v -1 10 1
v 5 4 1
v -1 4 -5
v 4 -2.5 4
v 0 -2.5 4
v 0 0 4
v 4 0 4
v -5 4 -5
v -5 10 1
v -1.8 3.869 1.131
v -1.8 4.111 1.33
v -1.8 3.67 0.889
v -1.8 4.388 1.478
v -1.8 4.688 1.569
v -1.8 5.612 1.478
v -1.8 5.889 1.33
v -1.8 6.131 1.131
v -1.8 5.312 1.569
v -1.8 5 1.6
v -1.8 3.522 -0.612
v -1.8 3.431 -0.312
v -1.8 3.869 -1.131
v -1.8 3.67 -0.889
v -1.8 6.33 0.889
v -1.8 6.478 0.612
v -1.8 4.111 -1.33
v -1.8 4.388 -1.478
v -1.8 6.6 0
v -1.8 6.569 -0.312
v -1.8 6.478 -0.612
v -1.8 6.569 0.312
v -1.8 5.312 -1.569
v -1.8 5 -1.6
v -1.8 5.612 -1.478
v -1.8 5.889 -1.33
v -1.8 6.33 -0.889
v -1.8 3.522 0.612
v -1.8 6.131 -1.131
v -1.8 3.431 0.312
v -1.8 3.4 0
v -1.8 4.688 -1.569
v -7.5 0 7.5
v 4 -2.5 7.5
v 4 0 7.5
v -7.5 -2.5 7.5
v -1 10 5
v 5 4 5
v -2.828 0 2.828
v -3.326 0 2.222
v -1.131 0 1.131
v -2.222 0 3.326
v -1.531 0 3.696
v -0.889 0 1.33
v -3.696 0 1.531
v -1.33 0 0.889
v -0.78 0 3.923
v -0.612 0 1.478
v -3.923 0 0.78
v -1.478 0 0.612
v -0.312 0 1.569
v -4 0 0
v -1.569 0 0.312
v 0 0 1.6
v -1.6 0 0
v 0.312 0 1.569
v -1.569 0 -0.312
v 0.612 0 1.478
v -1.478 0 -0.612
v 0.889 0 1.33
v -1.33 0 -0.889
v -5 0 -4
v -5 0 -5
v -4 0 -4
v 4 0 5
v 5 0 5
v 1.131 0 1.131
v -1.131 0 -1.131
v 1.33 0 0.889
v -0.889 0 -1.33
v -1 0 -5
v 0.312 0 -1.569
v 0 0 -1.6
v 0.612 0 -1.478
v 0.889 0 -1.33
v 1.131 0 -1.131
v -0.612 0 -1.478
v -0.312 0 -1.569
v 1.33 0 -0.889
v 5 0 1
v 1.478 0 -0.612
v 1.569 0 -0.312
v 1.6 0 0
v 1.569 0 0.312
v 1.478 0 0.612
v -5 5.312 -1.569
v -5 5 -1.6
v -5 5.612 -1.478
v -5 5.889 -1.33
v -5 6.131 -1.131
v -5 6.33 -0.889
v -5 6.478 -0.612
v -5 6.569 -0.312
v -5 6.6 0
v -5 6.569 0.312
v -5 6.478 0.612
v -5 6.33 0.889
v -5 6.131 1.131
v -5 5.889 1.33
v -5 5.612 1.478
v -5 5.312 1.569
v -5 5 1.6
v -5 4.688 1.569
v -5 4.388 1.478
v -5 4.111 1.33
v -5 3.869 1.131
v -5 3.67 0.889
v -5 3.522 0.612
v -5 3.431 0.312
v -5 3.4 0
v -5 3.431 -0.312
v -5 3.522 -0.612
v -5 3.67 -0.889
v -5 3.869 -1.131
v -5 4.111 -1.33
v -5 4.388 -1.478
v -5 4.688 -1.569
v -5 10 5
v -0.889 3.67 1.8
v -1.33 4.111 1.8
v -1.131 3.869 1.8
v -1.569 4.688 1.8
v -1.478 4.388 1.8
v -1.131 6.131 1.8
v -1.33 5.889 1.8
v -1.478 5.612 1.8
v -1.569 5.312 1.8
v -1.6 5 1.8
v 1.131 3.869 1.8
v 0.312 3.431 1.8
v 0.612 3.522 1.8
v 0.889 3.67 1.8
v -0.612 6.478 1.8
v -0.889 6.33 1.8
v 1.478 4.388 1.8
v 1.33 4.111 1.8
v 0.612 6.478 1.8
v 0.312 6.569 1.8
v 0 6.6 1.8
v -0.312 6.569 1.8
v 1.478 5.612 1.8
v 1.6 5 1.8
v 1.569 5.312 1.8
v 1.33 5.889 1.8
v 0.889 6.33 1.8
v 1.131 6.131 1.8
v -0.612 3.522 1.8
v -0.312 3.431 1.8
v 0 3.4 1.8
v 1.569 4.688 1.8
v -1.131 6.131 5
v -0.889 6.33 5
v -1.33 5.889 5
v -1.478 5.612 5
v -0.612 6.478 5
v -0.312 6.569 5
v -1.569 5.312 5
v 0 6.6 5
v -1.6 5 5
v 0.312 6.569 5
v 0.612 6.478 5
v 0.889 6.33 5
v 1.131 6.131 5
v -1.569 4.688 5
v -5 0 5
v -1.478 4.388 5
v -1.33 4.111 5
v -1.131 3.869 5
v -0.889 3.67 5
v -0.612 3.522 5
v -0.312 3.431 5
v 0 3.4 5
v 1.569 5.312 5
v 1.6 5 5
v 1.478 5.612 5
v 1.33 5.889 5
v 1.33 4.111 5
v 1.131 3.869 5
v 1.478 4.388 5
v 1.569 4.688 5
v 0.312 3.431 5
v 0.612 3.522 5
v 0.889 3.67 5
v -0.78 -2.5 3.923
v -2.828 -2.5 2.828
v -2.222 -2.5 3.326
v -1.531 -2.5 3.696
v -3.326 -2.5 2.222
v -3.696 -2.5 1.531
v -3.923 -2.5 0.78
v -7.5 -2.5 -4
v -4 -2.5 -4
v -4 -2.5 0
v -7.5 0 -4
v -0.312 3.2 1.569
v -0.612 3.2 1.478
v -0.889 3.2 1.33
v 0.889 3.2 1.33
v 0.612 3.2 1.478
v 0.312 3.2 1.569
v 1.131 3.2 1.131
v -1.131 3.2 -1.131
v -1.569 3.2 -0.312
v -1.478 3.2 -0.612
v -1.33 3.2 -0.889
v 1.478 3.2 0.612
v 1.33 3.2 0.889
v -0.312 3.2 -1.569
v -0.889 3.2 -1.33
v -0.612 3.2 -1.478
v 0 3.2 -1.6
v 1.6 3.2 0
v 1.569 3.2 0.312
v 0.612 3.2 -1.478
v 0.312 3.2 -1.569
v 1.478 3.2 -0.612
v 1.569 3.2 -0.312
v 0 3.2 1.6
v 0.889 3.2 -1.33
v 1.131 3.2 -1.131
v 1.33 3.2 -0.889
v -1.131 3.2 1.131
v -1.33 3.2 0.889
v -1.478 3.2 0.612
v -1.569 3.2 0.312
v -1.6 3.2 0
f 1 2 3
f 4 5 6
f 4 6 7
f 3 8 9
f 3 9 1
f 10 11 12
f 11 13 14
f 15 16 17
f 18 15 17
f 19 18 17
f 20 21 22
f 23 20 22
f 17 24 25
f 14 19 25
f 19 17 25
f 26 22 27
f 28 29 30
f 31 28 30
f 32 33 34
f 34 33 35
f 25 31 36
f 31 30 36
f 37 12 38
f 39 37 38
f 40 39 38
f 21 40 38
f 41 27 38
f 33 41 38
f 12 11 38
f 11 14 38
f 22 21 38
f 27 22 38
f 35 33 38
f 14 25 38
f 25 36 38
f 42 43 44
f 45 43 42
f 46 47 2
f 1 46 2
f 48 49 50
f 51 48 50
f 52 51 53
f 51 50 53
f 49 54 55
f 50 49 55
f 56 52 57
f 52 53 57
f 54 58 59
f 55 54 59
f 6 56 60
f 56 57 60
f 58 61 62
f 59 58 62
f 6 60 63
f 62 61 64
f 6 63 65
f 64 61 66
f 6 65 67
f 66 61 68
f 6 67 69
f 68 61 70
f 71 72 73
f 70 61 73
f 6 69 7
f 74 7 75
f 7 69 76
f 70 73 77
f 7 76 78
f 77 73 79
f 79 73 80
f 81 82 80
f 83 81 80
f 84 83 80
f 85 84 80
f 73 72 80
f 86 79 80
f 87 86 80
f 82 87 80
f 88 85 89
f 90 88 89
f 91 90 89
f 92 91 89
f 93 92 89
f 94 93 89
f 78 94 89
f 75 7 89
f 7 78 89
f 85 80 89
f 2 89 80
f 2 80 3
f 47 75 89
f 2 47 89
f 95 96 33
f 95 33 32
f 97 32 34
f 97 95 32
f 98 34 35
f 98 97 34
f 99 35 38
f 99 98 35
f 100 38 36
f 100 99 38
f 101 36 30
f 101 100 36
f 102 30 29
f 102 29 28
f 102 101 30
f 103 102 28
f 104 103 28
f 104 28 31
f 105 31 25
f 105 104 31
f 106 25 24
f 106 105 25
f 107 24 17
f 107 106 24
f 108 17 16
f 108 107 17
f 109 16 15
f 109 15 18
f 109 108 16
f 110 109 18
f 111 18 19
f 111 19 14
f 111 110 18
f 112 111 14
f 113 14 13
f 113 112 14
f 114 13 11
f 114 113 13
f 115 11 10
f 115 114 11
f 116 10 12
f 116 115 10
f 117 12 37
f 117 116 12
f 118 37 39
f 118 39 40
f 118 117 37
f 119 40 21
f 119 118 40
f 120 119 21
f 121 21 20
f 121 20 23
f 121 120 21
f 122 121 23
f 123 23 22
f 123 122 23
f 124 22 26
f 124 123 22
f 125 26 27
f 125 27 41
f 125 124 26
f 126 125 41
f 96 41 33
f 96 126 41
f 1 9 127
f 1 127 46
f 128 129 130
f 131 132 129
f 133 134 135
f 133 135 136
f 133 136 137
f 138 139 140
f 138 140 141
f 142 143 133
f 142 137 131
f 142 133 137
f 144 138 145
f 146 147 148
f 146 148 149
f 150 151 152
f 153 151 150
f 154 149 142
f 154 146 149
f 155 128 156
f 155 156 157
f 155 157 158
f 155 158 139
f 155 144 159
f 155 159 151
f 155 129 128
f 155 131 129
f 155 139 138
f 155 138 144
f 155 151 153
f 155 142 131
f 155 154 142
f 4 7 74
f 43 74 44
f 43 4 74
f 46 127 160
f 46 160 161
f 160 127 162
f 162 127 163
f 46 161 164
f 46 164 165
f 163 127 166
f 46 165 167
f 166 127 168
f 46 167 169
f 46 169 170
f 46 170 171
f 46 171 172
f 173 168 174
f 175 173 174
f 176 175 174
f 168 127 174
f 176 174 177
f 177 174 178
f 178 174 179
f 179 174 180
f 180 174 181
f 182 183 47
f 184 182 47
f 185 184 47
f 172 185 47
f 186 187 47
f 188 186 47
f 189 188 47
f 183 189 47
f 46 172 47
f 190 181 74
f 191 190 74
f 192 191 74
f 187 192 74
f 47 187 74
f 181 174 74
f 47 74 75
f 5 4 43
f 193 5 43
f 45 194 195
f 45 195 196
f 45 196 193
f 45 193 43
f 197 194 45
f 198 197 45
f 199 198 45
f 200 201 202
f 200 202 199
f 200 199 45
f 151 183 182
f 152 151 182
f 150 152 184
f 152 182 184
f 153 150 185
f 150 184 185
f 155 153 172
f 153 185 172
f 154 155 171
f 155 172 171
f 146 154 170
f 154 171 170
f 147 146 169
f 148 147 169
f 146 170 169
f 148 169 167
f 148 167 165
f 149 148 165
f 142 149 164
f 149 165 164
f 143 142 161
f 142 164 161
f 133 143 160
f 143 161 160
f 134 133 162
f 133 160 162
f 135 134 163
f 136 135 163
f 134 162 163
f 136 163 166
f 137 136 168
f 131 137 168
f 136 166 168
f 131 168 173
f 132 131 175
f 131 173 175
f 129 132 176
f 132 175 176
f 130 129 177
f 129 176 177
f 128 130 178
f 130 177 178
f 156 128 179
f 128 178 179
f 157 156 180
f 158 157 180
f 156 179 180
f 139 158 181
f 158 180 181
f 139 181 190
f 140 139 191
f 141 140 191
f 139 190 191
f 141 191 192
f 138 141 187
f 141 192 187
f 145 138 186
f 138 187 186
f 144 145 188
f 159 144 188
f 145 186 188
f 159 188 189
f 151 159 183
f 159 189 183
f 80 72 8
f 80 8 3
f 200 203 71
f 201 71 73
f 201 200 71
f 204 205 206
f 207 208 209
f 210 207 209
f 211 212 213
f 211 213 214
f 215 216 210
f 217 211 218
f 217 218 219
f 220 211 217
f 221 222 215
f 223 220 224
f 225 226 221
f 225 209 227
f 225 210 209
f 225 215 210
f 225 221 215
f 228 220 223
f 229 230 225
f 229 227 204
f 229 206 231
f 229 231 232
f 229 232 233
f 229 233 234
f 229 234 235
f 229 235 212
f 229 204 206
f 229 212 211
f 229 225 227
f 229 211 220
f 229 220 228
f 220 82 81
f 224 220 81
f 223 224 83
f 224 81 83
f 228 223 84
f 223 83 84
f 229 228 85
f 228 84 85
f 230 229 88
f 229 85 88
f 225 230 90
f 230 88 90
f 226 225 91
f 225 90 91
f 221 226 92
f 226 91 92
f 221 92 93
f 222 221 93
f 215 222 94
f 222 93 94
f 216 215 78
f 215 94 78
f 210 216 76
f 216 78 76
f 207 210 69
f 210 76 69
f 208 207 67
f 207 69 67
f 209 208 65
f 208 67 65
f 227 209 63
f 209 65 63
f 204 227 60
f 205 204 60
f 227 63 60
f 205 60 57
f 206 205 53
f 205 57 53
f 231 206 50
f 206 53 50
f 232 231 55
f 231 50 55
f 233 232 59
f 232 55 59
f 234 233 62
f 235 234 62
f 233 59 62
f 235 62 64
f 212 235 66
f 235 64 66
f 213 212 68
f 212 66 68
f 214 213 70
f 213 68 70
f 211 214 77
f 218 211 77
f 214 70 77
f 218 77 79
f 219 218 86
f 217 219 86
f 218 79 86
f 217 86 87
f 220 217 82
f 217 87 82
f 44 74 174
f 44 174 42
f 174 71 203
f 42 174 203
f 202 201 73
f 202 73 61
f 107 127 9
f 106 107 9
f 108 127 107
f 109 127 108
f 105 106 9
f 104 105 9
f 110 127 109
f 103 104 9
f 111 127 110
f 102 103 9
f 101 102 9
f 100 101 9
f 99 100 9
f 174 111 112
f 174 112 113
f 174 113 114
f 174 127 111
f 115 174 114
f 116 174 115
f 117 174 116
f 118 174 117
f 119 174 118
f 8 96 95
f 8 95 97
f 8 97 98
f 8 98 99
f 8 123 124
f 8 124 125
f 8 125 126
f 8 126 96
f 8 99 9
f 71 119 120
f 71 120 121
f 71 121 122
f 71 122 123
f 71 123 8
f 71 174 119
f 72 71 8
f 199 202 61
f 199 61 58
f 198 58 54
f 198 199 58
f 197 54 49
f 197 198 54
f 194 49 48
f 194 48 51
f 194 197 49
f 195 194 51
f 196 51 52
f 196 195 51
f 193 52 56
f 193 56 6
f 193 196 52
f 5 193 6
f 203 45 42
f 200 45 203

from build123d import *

# Parameters (mm, degrees)
SKETCH1_W           = 10
SKETCH1_H           = 10
BOSS_EXTRUDE1_DEPTH = 10
SKETCH2_R           = 1.6
CUT_EXTRUDE1_DEPTH  = 3.2
SKETCH3_R           = 1.6
CUT_EXTRUDE3_DEPTH  = 3.2
SKETCH4_R           = 1.6
CUT_EXTRUDE4_DEPTH  = 3.2
CHAMFER1_SIZE       = 6
BOSS_EXTRUDE2_DEPTH = 2.5


with BuildPart() as part:
    # Sketch1 → Boss-Extrude1 (new body)
    with BuildSketch(Plane(origin=(0, 0, 0), x_dir=(1, 0, 0), z_dir=(0, 1, 0))):
        Rectangle(SKETCH1_W, SKETCH1_H)
    extrude(amount=BOSS_EXTRUDE1_DEPTH)

    # Sketch2 → Cut-Extrude1 (cut)
    with BuildSketch(Plane.XY.offset(5)):
        with Locations((0, 5)):
            Circle(SKETCH2_R)
    extrude(amount=-CUT_EXTRUDE1_DEPTH, mode=Mode.SUBTRACT)

    # Sketch3 → Cut-Extrude3 (cut)
    with BuildSketch(Plane(origin=(0, 0, 0), x_dir=(-1, 0, 0), z_dir=(0, -1, 0))):
        with Locations(Location((0, 0, 0), (0, 0, 90))):
            Circle(SKETCH3_R)
    extrude(amount=-CUT_EXTRUDE3_DEPTH, mode=Mode.SUBTRACT)

    # Sketch4 → Cut-Extrude4 (cut)
    with BuildSketch(Plane(origin=(-5, 0, 0), x_dir=(0, 0, -1), z_dir=(1, 0, 0))):
        with Locations((0, 5)):
            Circle(SKETCH4_R)
    extrude(amount=CUT_EXTRUDE4_DEPTH, mode=Mode.SUBTRACT)

    # Chamfer1
    chamfer1_edges = [part.edges().sort_by_distance(p)[0] for p in [
        (5, 10, 0),
        (5, 5, -5),
        (0, 10, -5),
    ]]
    chamfer(chamfer1_edges, length=CHAMFER1_SIZE)

    # Sketch5 → Boss-Extrude2 (add)
    with BuildSketch(Plane(origin=(0, -2.5, 0), x_dir=(-1, 0, 0), z_dir=(0, -1, 0))):
        with BuildLine():
            Line((-4, -4), (-4, -7.5))
            Line((-4, -7.5), (7.5, -7.5))
            Line((7.5, -7.5), (7.5, 4))
            Line((7.5, 4), (4, 4))
            Line((4, 4), (4, 0))
            ThreePointArc((4, 0), (2.828427125, -2.828427125), (0, -4))
            Line((0, -4), (-4, -4))
        make_face()
    extrude(amount=-BOSS_EXTRUDE2_DEPTH)


solid = part.part
